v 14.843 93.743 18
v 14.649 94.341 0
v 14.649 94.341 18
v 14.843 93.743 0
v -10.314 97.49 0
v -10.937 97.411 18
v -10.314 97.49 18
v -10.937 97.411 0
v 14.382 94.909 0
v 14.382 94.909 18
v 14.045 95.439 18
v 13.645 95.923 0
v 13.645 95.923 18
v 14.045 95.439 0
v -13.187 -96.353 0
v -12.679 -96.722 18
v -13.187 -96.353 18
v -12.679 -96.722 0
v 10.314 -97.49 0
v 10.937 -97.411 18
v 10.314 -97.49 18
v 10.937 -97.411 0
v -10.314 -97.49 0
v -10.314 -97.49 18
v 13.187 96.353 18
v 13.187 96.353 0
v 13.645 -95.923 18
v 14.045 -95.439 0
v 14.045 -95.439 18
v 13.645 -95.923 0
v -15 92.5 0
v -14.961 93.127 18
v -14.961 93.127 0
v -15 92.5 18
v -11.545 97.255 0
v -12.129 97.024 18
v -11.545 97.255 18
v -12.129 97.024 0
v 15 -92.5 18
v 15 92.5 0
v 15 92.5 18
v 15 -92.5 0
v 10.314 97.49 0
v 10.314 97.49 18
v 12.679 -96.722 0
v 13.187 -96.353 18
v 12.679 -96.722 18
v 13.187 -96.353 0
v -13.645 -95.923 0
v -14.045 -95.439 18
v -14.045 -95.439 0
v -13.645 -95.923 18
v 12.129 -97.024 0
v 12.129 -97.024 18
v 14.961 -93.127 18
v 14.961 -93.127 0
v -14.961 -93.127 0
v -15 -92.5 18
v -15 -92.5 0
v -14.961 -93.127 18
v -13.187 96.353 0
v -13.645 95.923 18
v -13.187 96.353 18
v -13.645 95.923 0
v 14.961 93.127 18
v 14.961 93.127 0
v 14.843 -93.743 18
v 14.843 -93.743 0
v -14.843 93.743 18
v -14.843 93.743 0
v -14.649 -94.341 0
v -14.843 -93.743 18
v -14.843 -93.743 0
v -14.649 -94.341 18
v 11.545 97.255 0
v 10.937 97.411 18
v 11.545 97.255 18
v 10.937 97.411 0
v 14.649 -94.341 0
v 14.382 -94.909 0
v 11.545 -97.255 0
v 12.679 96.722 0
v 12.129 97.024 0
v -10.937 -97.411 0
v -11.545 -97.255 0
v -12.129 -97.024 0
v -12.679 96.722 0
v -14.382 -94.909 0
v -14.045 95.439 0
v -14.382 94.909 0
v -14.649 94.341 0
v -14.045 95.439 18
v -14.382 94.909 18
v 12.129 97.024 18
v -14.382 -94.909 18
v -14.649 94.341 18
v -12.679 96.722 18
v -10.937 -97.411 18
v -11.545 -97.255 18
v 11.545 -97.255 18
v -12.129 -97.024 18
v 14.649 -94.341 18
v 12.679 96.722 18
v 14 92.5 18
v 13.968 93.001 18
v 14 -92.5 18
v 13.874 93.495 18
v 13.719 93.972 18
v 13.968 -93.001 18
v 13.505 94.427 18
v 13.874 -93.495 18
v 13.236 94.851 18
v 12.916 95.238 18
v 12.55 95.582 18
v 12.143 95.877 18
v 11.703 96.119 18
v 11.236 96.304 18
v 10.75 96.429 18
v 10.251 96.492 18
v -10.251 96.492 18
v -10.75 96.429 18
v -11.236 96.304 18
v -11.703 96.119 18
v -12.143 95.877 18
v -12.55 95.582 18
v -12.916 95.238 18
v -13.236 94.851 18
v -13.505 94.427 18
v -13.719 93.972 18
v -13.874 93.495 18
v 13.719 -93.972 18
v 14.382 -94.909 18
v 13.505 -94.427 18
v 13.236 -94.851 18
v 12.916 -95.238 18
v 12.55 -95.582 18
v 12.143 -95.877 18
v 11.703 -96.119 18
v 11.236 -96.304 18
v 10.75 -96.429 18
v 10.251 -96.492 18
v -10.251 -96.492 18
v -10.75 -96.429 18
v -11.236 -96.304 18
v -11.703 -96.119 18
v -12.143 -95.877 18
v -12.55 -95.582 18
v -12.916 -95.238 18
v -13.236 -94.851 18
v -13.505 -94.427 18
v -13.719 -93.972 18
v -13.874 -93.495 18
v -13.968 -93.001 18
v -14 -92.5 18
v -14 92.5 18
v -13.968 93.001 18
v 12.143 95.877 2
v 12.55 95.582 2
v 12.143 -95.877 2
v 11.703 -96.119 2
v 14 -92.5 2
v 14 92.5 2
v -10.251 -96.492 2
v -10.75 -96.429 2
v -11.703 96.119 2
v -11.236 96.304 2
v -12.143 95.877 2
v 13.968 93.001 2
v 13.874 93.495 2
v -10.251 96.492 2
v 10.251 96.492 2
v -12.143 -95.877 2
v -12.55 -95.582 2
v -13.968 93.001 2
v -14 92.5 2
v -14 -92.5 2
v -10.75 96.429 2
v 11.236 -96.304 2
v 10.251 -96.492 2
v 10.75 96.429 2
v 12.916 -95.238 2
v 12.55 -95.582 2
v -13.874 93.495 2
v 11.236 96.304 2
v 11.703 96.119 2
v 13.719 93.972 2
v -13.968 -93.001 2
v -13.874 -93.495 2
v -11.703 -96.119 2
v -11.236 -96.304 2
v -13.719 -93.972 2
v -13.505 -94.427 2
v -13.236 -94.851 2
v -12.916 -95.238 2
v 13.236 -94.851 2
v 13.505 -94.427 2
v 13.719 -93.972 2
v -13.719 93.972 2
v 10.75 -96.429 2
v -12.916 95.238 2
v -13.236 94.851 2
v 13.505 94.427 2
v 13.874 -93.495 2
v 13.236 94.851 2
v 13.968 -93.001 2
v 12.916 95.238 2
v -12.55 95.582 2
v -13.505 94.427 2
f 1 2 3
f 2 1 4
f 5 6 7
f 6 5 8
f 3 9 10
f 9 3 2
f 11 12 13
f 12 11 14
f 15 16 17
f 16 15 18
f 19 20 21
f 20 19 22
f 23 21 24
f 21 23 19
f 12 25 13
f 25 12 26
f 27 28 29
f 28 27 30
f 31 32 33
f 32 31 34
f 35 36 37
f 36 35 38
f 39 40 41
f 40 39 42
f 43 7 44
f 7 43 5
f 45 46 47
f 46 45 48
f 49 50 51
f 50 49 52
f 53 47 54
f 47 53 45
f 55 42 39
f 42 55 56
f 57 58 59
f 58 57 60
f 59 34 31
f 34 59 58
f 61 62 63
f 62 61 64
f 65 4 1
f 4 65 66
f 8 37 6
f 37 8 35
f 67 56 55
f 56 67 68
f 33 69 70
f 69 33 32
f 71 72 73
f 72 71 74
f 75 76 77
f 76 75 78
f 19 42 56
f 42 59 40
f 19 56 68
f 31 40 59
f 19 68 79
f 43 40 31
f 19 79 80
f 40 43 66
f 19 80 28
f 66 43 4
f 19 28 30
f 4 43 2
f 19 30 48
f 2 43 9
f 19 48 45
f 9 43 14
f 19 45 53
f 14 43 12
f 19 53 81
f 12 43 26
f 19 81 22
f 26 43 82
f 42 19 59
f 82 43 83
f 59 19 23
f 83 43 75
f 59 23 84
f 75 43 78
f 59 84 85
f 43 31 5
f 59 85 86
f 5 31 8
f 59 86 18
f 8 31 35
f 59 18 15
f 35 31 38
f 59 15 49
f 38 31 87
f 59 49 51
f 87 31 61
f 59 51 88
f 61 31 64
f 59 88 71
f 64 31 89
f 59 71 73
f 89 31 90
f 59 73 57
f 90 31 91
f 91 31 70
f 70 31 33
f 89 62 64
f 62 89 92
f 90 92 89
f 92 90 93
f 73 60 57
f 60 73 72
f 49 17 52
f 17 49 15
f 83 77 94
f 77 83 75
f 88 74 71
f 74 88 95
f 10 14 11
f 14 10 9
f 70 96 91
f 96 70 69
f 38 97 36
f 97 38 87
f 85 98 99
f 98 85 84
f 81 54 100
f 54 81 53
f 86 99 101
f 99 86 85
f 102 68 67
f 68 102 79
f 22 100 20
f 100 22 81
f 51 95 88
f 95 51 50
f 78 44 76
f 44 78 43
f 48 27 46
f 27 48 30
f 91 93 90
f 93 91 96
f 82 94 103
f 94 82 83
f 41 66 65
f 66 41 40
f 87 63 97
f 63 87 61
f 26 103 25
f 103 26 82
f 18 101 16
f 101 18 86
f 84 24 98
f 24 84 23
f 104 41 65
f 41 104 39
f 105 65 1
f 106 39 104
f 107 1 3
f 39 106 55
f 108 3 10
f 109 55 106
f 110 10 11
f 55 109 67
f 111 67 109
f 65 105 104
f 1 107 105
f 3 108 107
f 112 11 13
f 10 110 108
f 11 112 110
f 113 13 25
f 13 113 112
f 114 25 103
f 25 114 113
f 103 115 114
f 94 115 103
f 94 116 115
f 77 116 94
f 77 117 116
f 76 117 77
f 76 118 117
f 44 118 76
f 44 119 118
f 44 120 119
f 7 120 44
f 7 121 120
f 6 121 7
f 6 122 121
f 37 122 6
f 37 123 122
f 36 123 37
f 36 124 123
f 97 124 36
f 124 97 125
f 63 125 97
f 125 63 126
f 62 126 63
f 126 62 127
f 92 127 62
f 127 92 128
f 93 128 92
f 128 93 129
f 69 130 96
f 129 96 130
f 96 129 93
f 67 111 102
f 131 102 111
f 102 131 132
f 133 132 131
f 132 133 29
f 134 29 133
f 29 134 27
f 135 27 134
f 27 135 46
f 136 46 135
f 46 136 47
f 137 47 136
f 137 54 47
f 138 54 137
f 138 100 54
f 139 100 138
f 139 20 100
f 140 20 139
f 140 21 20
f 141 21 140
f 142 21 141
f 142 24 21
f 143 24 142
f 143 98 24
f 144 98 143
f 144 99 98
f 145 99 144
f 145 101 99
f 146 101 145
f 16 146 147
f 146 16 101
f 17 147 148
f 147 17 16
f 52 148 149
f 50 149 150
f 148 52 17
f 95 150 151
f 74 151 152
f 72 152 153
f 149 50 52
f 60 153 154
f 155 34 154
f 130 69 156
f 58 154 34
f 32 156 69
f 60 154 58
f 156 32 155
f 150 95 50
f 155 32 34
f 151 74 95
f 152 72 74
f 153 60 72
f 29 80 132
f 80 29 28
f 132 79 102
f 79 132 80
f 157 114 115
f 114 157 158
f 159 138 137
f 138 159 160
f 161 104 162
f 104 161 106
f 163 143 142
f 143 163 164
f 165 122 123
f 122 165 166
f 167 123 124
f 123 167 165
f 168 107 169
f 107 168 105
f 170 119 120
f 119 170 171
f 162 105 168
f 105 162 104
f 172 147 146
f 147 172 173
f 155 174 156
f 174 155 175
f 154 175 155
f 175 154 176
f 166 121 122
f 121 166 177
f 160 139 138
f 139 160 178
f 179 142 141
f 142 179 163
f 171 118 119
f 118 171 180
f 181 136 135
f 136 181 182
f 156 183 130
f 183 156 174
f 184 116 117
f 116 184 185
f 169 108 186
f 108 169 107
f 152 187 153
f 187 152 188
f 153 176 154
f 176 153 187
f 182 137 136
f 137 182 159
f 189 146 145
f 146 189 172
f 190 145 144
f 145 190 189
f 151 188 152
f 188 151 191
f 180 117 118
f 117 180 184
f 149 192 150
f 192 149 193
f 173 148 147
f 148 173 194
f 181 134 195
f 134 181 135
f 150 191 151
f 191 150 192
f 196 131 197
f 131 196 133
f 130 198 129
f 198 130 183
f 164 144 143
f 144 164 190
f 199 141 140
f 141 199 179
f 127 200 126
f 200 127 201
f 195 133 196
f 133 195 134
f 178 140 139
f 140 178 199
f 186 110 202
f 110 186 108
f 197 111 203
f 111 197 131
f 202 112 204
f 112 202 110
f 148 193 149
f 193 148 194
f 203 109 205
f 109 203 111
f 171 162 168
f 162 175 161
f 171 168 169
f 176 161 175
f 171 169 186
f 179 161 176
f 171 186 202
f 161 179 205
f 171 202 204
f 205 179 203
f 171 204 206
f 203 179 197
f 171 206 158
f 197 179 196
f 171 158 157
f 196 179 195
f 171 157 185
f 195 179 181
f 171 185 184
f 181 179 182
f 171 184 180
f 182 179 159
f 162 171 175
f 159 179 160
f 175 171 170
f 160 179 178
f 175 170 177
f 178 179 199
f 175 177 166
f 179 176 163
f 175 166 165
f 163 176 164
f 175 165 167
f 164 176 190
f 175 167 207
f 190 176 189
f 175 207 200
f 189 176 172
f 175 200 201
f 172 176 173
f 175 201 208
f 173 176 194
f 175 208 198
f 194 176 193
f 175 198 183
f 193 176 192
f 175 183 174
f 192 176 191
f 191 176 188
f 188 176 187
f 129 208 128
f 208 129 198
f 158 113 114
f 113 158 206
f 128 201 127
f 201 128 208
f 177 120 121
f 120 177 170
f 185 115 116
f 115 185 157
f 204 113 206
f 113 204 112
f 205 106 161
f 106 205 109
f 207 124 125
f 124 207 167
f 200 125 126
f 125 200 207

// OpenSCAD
$fn = 50;


difference() {
	union() {
		hull() {
			translate(v = [-10.0000000000, 92.5000000000, 0]) {
				cylinder(h = 18, r = 5);
			}
			translate(v = [10.0000000000, 92.5000000000, 0]) {
				cylinder(h = 18, r = 5);
			}
			translate(v = [-10.0000000000, -92.5000000000, 0]) {
				cylinder(h = 18, r = 5);
			}
			translate(v = [10.0000000000, -92.5000000000, 0]) {
				cylinder(h = 18, r = 5);
			}
		}
	}
	union() {
		translate(v = [0, 0, 2]) {
			hull() {
				translate(v = [-10.0000000000, 92.5000000000, 0]) {
					cylinder(h = 16, r = 4);
				}
				translate(v = [10.0000000000, 92.5000000000, 0]) {
					cylinder(h = 16, r = 4);
				}
				translate(v = [-10.0000000000, -92.5000000000, 0]) {
					cylinder(h = 16, r = 4);
				}
				translate(v = [10.0000000000, -92.5000000000, 0]) {
					cylinder(h = 16, r = 4);
				}
			}
		}
	}
}
